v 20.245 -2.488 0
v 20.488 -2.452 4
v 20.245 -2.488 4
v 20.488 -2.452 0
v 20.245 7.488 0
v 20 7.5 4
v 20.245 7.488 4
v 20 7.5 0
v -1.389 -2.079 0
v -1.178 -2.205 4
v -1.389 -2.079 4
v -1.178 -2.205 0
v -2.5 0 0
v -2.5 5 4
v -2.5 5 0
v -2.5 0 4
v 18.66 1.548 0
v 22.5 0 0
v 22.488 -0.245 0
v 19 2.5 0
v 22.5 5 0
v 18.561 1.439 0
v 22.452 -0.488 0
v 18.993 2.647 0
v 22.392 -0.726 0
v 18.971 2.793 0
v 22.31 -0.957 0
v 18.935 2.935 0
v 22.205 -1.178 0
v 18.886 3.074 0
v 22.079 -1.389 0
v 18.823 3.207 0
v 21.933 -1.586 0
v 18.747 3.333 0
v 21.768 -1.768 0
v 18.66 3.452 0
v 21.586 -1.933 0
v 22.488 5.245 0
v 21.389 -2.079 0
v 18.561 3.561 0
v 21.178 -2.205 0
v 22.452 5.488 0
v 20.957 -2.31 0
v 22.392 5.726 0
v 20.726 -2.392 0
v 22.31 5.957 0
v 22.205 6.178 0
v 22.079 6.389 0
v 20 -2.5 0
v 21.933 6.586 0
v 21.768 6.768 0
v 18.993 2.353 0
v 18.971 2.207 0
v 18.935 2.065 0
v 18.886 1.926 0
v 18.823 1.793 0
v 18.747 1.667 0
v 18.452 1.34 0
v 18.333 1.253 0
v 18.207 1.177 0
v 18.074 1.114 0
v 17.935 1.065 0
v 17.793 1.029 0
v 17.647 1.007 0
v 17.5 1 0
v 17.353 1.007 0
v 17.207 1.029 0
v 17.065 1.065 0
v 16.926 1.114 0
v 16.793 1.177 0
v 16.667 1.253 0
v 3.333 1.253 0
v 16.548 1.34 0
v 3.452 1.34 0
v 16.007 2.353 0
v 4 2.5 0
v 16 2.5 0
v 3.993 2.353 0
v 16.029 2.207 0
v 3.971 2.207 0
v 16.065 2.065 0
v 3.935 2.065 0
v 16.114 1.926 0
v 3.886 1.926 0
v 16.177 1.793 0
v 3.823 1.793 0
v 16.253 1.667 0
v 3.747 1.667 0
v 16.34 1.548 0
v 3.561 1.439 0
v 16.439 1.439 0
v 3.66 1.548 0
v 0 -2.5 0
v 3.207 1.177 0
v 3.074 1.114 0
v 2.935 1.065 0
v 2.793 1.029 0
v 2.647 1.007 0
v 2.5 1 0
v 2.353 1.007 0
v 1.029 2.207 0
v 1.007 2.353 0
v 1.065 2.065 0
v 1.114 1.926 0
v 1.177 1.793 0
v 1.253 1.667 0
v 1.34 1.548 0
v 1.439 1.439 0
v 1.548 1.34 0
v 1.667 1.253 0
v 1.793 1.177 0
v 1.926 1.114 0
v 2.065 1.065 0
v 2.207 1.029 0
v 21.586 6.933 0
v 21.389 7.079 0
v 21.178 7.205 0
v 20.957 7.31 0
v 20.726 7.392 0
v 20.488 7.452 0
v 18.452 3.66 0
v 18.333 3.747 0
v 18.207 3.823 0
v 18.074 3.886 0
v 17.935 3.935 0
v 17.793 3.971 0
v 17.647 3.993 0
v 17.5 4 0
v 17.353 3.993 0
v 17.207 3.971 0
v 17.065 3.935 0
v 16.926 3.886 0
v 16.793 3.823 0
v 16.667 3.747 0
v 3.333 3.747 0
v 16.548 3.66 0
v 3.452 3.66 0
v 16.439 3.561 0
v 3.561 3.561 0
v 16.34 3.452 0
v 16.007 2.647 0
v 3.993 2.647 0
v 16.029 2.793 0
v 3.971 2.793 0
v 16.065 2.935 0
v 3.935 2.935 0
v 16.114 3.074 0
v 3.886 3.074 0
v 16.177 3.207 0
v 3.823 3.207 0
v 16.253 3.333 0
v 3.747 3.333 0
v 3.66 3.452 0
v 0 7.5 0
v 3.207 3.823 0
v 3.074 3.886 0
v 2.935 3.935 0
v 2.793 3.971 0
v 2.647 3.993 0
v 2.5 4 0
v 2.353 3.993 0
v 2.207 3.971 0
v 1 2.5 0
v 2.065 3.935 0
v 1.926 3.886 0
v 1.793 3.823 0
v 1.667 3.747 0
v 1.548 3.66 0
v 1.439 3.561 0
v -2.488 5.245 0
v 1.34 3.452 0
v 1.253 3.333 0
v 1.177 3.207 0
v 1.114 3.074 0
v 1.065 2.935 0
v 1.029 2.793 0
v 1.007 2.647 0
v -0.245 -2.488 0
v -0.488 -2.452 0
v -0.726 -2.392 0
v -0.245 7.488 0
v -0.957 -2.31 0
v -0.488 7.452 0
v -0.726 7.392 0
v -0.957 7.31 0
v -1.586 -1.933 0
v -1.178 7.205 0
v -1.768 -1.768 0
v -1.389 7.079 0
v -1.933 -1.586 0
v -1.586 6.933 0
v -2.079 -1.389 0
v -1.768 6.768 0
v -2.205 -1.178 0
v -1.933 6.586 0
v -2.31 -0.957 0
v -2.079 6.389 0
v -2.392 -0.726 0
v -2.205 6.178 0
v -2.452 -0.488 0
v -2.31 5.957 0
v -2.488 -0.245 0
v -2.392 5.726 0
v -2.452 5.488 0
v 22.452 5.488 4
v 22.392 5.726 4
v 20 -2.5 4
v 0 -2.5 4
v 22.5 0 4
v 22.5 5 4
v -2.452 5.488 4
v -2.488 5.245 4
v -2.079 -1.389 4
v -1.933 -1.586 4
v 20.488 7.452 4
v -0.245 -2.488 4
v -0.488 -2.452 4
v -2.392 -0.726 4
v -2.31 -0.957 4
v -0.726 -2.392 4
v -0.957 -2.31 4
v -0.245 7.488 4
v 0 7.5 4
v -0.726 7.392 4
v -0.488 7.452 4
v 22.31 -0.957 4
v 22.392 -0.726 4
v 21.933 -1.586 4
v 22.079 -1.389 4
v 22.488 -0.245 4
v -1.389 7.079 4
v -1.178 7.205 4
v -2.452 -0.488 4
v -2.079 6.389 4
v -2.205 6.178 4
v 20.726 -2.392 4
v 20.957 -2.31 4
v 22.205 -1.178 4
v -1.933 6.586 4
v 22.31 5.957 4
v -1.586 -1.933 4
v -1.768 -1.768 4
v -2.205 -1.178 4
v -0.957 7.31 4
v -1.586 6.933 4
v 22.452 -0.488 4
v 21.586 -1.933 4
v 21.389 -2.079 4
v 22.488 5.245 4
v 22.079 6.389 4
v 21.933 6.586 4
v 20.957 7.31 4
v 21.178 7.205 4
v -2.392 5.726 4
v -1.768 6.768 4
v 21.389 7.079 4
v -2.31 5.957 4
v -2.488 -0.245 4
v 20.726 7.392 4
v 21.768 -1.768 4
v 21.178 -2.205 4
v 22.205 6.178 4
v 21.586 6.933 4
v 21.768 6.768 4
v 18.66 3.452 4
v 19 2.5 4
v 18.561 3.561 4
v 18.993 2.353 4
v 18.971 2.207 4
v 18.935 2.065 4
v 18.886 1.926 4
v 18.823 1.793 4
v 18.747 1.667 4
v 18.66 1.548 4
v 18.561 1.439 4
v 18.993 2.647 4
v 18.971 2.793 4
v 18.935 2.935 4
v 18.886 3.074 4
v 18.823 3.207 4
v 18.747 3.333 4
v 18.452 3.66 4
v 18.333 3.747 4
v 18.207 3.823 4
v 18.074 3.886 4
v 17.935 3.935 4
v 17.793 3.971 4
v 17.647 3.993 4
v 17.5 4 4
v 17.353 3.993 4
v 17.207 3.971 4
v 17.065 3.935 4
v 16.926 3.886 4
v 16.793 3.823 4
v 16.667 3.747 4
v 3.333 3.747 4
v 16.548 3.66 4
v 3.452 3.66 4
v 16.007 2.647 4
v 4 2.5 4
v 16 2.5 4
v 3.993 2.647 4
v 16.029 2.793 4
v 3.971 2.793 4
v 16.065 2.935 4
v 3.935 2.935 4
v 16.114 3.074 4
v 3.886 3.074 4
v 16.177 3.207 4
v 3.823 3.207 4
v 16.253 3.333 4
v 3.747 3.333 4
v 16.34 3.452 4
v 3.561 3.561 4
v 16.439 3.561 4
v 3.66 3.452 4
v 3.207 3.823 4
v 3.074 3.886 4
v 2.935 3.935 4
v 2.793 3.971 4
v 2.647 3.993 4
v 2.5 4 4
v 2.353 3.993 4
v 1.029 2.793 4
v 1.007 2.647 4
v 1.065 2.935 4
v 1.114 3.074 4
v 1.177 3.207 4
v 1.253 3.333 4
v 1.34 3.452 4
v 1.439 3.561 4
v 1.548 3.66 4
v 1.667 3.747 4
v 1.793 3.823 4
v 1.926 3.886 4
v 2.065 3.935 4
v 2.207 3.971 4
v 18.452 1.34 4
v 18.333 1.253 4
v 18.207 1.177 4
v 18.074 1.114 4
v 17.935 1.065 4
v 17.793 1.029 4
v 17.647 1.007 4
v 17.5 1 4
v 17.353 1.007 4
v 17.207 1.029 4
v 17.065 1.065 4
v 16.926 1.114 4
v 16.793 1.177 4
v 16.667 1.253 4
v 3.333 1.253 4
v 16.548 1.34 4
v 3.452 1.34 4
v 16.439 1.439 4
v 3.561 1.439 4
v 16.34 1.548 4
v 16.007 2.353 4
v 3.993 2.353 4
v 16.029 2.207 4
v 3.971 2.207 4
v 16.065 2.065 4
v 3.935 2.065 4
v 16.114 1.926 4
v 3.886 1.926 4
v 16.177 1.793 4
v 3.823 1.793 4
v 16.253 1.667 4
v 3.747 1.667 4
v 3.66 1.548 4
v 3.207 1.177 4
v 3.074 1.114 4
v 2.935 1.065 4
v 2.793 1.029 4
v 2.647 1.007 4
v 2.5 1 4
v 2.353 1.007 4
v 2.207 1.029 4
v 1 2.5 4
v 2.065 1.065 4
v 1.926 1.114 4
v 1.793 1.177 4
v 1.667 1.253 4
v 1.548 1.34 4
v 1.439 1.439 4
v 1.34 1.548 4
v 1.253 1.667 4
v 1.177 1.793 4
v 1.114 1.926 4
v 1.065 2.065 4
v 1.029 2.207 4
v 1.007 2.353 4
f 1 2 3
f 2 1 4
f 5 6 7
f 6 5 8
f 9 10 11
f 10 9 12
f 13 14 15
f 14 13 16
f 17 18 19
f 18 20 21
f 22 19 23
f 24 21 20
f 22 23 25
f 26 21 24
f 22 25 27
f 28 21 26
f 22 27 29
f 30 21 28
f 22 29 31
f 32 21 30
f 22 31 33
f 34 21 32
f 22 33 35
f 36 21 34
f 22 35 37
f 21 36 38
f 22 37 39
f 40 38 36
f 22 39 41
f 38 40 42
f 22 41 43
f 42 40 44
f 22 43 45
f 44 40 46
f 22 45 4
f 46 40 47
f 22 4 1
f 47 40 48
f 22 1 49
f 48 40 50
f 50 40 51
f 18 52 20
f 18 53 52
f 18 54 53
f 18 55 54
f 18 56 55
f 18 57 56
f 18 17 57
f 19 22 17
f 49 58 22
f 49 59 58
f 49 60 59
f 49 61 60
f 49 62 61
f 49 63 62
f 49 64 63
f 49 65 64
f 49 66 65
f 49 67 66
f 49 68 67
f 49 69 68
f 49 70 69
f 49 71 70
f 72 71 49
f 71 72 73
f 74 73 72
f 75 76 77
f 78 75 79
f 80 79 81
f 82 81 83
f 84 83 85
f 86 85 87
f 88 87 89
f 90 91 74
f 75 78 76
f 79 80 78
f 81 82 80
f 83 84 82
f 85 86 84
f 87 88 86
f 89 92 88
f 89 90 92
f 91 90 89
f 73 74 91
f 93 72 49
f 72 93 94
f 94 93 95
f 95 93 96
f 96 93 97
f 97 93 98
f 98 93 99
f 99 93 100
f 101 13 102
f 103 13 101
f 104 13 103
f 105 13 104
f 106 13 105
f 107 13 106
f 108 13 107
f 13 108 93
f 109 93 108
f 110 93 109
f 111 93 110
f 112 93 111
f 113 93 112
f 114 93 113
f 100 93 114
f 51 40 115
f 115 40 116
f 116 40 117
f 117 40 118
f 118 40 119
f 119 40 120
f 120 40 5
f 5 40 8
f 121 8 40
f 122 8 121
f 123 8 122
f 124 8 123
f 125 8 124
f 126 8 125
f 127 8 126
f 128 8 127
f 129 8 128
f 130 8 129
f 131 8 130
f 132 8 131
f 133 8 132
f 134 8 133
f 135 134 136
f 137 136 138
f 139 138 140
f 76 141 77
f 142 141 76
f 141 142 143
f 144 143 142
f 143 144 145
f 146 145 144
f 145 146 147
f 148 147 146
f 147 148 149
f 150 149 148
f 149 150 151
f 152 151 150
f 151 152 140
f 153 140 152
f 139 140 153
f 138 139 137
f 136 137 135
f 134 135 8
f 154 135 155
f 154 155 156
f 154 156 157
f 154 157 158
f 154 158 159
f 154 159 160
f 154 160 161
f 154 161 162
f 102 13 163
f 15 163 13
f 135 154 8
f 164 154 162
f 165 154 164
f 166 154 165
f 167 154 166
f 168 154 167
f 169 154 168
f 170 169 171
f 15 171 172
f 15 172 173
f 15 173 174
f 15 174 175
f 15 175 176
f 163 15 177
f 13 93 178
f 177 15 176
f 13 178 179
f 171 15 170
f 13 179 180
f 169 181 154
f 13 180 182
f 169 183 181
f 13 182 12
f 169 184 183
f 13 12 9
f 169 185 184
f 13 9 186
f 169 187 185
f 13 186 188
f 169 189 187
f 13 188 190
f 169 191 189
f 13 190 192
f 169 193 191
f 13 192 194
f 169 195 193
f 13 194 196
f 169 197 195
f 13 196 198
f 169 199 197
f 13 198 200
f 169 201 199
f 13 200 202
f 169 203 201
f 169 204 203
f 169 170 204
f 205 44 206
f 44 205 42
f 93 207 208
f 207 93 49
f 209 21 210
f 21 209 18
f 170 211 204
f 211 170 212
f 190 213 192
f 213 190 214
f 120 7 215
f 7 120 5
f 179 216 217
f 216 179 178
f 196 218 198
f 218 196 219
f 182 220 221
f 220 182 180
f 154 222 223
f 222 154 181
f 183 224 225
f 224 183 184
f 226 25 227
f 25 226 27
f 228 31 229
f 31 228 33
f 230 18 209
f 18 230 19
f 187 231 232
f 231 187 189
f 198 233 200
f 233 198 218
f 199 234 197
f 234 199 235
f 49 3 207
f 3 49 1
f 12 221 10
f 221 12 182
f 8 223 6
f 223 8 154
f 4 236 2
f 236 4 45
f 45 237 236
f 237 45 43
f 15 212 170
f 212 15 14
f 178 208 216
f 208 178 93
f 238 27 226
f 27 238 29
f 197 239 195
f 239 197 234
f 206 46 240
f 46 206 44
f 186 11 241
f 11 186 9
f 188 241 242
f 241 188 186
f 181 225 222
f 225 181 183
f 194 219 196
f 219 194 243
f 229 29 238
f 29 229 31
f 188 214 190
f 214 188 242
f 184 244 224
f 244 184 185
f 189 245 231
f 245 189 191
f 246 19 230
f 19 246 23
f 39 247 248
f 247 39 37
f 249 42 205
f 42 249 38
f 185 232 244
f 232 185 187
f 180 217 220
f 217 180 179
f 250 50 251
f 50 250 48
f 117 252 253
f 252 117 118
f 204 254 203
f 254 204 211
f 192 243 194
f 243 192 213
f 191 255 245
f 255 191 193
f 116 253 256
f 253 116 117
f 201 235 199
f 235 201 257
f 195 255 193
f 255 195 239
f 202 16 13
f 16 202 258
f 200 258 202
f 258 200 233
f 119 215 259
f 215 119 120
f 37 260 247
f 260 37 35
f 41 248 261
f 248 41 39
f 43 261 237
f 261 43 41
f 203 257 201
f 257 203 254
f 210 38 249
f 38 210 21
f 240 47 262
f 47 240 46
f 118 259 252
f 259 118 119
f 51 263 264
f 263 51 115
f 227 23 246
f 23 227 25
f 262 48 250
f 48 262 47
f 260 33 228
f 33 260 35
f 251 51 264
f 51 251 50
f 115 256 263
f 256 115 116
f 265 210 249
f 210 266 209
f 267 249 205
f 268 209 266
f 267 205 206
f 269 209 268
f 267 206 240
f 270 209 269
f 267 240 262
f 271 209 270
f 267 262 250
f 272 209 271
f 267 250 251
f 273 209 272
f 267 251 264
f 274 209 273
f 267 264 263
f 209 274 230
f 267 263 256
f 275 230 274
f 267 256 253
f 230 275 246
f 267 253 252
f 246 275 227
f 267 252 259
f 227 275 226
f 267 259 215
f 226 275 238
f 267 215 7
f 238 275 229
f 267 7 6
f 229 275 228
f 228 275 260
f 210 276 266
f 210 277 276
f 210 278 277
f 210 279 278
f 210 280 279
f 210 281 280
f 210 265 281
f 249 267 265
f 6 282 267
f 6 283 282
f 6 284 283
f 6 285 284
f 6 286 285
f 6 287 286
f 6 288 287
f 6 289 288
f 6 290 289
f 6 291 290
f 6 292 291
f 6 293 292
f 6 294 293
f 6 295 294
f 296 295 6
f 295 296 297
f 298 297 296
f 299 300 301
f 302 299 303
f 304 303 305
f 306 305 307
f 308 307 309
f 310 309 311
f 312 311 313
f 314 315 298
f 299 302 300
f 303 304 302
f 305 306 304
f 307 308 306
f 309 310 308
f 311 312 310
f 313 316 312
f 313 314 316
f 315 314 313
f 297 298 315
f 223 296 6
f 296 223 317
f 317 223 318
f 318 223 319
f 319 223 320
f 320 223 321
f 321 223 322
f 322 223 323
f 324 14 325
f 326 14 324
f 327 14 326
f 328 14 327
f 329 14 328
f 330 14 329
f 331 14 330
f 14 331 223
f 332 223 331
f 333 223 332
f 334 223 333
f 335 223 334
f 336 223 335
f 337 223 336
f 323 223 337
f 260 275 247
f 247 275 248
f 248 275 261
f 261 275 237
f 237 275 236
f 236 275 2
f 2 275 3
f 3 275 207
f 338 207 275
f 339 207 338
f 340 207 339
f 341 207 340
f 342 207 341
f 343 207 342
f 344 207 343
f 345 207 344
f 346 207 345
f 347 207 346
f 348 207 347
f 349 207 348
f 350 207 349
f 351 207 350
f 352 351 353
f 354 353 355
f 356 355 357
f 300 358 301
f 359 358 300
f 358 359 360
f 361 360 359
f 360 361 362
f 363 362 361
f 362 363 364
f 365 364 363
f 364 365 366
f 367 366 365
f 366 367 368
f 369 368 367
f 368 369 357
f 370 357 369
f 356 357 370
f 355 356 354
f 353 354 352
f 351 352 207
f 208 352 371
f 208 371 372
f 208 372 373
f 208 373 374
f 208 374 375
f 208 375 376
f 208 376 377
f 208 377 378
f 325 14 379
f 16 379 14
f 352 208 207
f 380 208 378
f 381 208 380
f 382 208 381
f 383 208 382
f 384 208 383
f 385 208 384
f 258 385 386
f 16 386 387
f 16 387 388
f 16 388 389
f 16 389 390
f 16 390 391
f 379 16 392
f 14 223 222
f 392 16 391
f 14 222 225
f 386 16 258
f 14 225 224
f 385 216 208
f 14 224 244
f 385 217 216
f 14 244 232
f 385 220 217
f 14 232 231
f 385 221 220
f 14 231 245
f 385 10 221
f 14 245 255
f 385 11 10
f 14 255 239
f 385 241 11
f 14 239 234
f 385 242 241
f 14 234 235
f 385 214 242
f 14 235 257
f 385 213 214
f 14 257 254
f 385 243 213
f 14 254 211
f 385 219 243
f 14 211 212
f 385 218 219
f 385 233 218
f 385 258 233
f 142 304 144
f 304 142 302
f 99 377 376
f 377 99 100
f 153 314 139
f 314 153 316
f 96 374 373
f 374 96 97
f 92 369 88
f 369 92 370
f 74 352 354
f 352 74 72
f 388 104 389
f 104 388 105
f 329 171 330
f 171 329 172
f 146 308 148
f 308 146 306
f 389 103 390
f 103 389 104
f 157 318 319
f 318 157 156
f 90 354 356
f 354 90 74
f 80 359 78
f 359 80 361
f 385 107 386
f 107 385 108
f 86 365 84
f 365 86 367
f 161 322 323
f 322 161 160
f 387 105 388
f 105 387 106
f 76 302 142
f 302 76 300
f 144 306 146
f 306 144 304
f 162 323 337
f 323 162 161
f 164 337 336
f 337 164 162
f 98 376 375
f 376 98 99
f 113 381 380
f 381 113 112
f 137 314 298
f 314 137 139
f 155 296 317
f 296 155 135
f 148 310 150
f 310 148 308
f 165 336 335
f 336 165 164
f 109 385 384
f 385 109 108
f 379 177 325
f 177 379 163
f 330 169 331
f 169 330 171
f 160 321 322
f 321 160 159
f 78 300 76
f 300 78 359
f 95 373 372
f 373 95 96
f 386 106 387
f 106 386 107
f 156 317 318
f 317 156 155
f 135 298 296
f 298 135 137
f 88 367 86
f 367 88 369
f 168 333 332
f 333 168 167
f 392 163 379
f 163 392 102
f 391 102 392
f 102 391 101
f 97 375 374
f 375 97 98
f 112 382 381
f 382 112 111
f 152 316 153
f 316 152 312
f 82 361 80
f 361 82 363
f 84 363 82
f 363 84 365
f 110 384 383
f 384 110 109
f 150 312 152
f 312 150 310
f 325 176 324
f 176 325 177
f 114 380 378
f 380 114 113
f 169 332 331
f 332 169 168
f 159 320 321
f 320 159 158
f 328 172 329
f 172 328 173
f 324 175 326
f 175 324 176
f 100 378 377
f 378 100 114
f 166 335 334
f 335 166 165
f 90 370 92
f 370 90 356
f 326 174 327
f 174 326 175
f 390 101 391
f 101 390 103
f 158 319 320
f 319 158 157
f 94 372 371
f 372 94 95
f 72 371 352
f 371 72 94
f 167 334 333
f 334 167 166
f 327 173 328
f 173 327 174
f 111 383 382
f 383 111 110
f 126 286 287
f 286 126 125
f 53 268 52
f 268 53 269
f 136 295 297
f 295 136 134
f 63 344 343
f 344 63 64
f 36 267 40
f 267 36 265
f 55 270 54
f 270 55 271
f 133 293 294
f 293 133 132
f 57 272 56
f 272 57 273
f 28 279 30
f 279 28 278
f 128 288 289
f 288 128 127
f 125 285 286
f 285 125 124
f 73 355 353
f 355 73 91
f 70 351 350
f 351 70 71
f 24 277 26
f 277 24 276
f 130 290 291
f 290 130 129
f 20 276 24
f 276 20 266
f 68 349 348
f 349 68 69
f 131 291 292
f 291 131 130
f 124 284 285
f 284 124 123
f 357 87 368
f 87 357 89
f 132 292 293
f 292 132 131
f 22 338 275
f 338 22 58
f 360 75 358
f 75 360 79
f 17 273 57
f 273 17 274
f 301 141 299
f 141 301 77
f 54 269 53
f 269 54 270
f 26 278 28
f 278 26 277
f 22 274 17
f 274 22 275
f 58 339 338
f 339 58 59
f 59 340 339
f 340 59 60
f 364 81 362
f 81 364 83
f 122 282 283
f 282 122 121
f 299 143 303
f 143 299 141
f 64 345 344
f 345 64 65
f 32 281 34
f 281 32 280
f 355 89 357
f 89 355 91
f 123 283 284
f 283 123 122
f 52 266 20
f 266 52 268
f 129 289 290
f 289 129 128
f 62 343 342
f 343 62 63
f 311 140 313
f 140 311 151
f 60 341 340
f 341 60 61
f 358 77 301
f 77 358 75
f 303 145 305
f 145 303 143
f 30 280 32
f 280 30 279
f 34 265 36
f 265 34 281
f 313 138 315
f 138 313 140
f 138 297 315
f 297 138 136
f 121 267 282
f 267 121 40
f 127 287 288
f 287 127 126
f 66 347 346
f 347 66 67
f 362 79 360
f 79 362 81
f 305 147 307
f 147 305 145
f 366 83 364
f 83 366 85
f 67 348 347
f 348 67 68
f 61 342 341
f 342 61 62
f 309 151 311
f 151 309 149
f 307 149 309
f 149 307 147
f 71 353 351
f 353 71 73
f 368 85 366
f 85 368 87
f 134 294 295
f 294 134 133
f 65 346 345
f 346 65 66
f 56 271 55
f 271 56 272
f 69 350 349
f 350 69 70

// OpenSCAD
// file: fan_holder_v2.scad
/*
OPENSCAD Library file by the DoomMeister
Mounting surround for small DC fans (25 - 120mm)

Data taken from various places around the internet.
http://www.qwikflow.com/dc_fans.html

//Released under the terms of the GNU GPL v3.0
This program is free software: you can redistribute it and/or modify
it under the terms of the GNU General Public License as published by
the Free Software Foundation, either version 3 of the License, or
(at your option) any later version.

This program is distributed in the hope that it will be useful,
but WITHOUT ANY WARRANTY; without even the implied warranty of
MERCHANTABILITY or FITNESS FOR A PARTICULAR PURPOSE. See the
GNU General Public License for more details.

You should have received a copy of the GNU General Public License
along with this program. If not, see <http://www.gnu.org/licenses/>.
*/

//uncomment this for example
//fan_mount(size=40,thick=3);

module fan_mount(size=40,thick = 4)
{
if(size == 25)
	{
	_fan_mount(
			fan_size = 25,
			fan_mounting_pitch = 20,
			fan_m_hole_dia = 3,
			holder_thickness = thick
		 );
	}
if(size == 30)
	{
	_fan_mount(
			fan_size = 30,
			fan_mounting_pitch = 24,
			fan_m_hole_dia = 3,
			holder_thickness = thick
		 );
	}

if(size == 40)
	{
	_fan_mount(
			fan_size = 40,
			fan_mounting_pitch = 32,
			fan_m_hole_dia = 3.5,
			holder_thickness = thick
		 );
	}
if(size == 45)
	{
	_fan_mount(
			fan_size = 45,
			fan_mounting_pitch = 37,
			fan_m_hole_dia = 4.3,
			holder_thickness = thick
		 );
	}
if(size == 60)
	{
	_fan_mount(
			fan_size = 60,
			fan_mounting_pitch = 50,
			fan_m_hole_dia = 4.4,
			holder_thickness = thick
		 );
	}
if(size == 80)
	{
	_fan_mount(
			fan_size = 80,
			fan_mounting_pitch = 71.5,
			fan_m_hole_dia = 4.4,
			holder_thickness = thick
		 );
	}

if(size == 120)
	{
	_fan_mount(
			fan_size = 120,
			fan_mounting_pitch = 105,
			fan_m_hole_dia = 4.4,
			holder_thickness = thick
		 );
	}
}


//inner module
module _fan_mount(
			fan_size, //nominsl size of fan
			fan_mounting_pitch, //pitch between mounting holes
			fan_m_hole_dia, //mounting hole diameter
			holder_thickness //user defined thickness
		 )
{

offset1 = (fan_size-(fan_mounting_pitch + fan_m_hole_dia))/2;
offset2 = (fan_size-(fan_mounting_pitch))/2;
offset3 = offset2 + fan_mounting_pitch;
thickness = (fan_size-fan_mounting_pitch)/2;	
			
			//difference()
			//{
			linear_extrude(height = holder_thickness)
			union()
			{	
			difference()
			{
				translate([fan_m_hole_dia/2,fan_m_hole_dia/2,0])
				minkowski()
				{	
					square([fan_size - fan_m_hole_dia,fan_size - fan_m_hole_dia]);
					circle(r= fan_m_hole_dia/2, $fn=20);
				}
			
					translate([offset1,offset1,0])
					square([fan_mounting_pitch + fan_m_hole_dia,fan_mounting_pitch + fan_m_hole_dia]);
				}
				translate([offset2,offset2,0])
				rotate([0,0,0])_corner_hole();
				translate([offset3,offset2,0])
				rotate([0,0,90])_corner_hole();
				translate([offset2,offset3,0])
				rotate([0,0,90])_corner_hole();
				translate([offset3,offset3,0])
				rotate([0,0,0])_corner_hole();
			}

module _corner_hole()
{
				difference(){
					union(){
							difference(){
							square([fan_m_hole_dia + thickness,fan_m_hole_dia + thickness],center=true);
							square([(fan_m_hole_dia + thickness)/2,(fan_m_hole_dia + thickness)/2],center=false);
							translate([-(fan_m_hole_dia + thickness)/2,-(fan_m_hole_dia + thickness)/2])
							square([(fan_m_hole_dia + thickness)/2,(fan_m_hole_dia + thickness)/2],center=false);
							}
					circle(r=(fan_m_hole_dia + thickness)/2, $fn=20);
					}
					circle(r=(fan_m_hole_dia)/2, $fn=20);
				}
}


echo(offset1,offset2,thickness);
}
// main file
use <fan_holder_v2.scad>

$fn=64;

fansize = 120;
module fanholder(fansize = 120,thickness = 4)
{
    radiuso = 5;
    radiusi = 2;
    translate([0,0,fansize]) rotate([0,90,0]) fan_mount(fansize,thickness);
    
    translate([radiuso+thickness,thickness,0]) rotate([0,0,0]) langloch(fansize,4,radiuso,radiusi);
    translate([radiuso+thickness,fansize,0]) rotate([0,0,0]) langloch(fansize,4,radiuso,radiusi);
}

module langloch(length,thickness,radiuso,radiusi)
{
    difference()
    {
        hull()
        {
            #translate([0,0,radiuso]) rotate([90,0,0]) cylinder(r=radiuso,h=thickness);
            #translate([0,0,length-radiuso]) rotate([90,0,0]) cylinder(r=radiuso,h=thickness);
            #translate([thickness,0,radiuso]) rotate([90,0,0]) cylinder(r=radiuso,h=thickness);
            #translate([thickness,0,length-radiuso]) rotate([90,0,0]) cylinder(r=radiuso,h=thickness);
        }
        hull()
        {
            #translate([thickness,0.5,radiuso]) rotate([90,0,0]) cylinder(r=radiusi,h=thickness+1);
            #translate([thickness,0.5,length/2-7.5-radiuso]) rotate([90,0,0]) cylinder(r=radiusi,h=thickness+1);
        }
        hull()
        {
            #translate([thickness,0.5,length/2+7.5+radiuso]) rotate([90,0,0]) cylinder(r=radiusi,h=thickness+1);
            #translate([thickness,0.5,length-radiuso]) rotate([90,0,0]) cylinder(r=radiusi,h=thickness+1);
        }
    }
}

module fan_frame_connector()
{
    length = 20;
    width = 5;
    radius = 2.5;
    difference()
    {
        minkowski()
        {
            cube([length,width,1]);
            cylinder(r=radius,h=3);
        }
        translate([radius,radius,-0.1]) cylinder(d=3,h=width);
        translate([length-radius,radius,-0.1]) cylinder(d=3,h=width);
//        translate([25,radius,-0.1]) cylinder(d=3,h=width);
//        translate([35,radius,-0.1]) cylinder(d=3,h=width);
    }
}

//fanholder(120,4);
fan_frame_connector();
